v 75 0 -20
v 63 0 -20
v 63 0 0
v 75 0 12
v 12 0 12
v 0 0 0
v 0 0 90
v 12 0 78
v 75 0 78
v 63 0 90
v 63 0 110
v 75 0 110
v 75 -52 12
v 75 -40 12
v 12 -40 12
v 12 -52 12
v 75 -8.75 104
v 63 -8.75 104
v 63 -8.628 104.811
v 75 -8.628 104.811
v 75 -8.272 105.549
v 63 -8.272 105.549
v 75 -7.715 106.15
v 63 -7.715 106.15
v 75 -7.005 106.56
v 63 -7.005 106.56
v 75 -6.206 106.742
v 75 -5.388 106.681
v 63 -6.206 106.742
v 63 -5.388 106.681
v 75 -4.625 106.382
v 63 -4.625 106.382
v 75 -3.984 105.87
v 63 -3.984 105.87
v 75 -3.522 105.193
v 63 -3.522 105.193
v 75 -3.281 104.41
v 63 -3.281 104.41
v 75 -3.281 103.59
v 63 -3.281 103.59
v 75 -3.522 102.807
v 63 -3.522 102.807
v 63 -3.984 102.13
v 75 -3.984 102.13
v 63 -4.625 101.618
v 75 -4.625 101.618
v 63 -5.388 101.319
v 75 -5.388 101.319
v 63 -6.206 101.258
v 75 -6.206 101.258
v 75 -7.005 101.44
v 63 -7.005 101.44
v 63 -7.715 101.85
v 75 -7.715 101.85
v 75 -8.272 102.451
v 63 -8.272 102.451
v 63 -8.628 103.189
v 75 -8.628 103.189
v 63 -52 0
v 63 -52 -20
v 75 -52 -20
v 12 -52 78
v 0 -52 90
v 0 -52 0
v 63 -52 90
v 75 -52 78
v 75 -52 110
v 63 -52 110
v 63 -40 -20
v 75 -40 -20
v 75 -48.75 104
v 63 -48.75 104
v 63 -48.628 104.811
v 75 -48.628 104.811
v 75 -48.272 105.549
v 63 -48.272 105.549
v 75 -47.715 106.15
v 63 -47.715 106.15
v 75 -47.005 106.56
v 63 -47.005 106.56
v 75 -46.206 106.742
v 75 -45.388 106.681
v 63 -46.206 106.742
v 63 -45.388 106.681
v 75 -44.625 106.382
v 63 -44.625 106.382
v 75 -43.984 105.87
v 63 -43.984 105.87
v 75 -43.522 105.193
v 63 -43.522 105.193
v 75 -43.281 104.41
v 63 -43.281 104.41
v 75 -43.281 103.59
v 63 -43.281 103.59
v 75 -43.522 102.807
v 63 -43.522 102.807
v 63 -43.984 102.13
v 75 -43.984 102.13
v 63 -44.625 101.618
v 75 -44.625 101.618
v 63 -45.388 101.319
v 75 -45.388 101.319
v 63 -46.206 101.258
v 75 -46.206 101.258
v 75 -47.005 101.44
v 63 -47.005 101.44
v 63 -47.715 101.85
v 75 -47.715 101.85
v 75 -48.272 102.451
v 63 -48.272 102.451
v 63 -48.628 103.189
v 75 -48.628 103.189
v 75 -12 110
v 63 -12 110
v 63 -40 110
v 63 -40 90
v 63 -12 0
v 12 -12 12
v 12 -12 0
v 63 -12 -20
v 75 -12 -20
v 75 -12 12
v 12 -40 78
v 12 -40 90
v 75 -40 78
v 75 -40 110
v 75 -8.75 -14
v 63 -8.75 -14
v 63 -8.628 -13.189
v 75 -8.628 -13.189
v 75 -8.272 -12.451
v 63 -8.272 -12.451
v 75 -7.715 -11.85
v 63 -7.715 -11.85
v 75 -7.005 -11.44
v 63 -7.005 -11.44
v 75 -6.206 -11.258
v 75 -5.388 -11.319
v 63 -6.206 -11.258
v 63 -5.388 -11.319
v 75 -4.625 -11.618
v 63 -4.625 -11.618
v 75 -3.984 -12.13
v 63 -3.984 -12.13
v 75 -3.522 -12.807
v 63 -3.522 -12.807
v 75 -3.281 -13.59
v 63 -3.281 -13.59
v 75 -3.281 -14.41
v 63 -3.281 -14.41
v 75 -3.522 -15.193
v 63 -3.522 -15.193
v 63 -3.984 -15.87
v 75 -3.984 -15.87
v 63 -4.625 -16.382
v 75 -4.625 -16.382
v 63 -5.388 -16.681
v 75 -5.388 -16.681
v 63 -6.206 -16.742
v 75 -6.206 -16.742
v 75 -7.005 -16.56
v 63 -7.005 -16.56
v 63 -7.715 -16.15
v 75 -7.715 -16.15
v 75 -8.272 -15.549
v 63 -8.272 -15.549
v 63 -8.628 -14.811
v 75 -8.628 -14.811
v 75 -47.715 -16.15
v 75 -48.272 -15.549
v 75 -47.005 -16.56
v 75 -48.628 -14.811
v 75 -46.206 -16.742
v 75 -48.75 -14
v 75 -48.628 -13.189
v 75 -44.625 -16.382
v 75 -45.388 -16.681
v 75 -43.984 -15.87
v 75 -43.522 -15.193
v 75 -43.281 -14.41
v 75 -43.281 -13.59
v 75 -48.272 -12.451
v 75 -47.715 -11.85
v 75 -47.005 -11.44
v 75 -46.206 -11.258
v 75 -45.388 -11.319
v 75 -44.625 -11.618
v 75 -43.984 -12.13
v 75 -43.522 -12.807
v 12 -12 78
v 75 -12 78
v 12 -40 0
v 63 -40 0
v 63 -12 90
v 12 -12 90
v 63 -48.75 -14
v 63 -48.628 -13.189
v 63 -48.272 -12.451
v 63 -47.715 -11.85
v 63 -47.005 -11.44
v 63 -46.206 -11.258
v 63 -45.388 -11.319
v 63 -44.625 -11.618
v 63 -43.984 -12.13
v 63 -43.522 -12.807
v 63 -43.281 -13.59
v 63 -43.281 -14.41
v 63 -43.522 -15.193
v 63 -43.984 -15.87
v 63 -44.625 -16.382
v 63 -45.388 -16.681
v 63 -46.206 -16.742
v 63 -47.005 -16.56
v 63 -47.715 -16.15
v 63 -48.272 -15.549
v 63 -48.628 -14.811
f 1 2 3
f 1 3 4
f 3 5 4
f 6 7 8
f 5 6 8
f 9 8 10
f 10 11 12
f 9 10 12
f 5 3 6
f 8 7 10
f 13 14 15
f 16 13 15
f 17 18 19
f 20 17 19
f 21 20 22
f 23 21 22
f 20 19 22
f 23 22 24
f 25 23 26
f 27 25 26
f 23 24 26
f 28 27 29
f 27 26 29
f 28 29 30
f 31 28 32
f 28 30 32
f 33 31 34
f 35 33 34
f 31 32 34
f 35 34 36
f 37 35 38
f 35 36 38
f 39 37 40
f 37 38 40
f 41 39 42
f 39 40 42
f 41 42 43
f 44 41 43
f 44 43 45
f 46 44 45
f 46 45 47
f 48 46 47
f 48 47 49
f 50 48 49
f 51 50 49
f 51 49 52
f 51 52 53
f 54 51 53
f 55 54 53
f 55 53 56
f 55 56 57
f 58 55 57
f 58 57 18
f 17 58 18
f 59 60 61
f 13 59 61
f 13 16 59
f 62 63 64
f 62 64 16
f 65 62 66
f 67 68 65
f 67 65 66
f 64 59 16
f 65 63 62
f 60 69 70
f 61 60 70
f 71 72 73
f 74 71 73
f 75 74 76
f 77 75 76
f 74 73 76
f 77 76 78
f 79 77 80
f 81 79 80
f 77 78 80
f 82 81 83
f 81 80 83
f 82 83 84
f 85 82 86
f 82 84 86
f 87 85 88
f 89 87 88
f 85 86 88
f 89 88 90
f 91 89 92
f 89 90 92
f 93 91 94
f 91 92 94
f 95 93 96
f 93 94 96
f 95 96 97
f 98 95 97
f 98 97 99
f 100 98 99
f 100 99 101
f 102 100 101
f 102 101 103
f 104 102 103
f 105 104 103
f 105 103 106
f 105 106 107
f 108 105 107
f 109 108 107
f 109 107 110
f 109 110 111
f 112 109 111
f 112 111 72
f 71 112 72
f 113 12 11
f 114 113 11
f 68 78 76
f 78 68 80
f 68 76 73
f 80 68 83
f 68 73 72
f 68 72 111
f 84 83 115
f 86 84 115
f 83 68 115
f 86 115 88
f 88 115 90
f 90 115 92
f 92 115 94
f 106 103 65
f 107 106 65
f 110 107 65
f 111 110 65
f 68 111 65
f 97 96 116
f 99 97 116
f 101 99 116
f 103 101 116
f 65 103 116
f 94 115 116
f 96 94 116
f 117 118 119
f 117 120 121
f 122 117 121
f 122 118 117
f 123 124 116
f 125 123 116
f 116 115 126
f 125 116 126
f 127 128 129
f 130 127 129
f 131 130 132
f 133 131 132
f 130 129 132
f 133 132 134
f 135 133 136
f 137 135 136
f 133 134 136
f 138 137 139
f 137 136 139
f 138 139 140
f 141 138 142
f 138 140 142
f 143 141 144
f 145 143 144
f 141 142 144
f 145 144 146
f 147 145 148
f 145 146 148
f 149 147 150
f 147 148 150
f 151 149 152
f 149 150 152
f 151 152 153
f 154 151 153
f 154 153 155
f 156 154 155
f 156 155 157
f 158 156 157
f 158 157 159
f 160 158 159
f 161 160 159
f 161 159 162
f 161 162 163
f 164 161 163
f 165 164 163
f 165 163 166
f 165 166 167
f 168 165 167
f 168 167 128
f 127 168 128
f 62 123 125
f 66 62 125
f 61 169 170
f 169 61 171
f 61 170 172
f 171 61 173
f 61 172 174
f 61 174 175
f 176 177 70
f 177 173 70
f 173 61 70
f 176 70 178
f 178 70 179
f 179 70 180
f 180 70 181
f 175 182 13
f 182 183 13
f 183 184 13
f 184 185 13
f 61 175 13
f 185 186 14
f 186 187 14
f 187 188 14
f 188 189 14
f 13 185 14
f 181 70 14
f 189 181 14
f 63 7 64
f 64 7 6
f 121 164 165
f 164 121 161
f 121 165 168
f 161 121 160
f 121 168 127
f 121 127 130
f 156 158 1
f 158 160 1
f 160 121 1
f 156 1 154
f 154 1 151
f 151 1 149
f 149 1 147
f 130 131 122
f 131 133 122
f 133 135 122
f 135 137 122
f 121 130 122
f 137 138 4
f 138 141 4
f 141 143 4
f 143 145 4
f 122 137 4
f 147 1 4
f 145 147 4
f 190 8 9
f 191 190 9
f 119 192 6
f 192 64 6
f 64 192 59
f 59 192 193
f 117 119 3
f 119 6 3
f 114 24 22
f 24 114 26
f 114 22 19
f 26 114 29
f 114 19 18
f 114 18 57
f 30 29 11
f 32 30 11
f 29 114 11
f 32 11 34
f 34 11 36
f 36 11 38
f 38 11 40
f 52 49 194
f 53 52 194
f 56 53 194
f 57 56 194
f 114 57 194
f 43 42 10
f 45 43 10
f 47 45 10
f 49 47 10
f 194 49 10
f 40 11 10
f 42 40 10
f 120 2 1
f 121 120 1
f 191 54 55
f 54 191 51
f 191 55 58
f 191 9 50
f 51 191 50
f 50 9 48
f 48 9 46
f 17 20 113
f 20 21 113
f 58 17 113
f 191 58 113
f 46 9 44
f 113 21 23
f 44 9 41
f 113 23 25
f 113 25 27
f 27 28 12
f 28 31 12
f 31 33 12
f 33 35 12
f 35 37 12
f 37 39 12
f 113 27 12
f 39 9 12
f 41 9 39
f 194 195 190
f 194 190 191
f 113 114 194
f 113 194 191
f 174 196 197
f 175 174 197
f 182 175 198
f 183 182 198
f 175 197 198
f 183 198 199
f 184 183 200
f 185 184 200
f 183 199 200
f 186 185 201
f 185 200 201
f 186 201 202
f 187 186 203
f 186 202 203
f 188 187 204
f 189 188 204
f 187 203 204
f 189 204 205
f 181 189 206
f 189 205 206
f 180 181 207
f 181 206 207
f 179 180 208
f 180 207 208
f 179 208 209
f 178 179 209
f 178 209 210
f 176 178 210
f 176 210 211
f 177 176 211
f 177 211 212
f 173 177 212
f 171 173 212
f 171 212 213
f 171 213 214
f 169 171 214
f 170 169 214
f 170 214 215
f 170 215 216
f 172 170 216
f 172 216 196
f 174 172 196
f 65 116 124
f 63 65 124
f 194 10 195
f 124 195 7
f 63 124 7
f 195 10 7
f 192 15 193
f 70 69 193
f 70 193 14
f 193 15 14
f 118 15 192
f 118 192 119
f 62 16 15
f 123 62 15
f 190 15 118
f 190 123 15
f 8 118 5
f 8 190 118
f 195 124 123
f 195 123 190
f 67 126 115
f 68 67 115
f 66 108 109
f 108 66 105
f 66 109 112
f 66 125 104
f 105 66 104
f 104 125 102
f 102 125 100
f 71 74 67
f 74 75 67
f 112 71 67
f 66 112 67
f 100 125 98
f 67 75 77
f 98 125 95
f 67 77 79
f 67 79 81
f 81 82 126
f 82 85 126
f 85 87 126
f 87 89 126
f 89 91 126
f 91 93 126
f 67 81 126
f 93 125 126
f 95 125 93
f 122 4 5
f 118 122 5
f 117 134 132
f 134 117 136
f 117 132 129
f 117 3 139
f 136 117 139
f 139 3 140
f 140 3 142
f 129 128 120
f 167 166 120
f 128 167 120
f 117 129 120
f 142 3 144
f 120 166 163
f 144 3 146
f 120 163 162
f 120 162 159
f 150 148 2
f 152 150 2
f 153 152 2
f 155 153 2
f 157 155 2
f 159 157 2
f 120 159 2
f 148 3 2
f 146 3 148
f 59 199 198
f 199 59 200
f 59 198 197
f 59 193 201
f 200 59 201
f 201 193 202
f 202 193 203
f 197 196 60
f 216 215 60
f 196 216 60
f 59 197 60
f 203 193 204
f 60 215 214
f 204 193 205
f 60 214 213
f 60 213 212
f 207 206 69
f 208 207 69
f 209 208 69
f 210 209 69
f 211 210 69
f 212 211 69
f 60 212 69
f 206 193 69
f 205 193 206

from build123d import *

# Parameters (mm, degrees)
F1_DEPTH      = 52
F2_W          = 63
F2_H          = 28
F3_DEPTH      = 110.001
F3_DEPTH_BACK = 20.001
F4_R          = 2.75
F5_DEPTH      = 12.001


with BuildPart() as f1:
    # F0 (on Front) → F1 (new body)
    with BuildSketch(Plane.XZ):
        Polygon((0, 12), (0, 0), (63, 0), (63, -20), (75, -20), (75, 0), (75, 12), (12, 12), (12, 78), (75, 78), (75, 90), (75, 110), (63, 110), (63, 90), (0, 90), align=None)
    extrude(amount=F1_DEPTH)

    # F2 (on face) → F3 (cut, two sides)
    with BuildSketch(Plane.XY.offset(90)) as f3_sk:
        with Locations((43.5, -26)):
            Rectangle(F2_W, F2_H)
    extrude(amount=-F3_DEPTH, mode=Mode.SUBTRACT)
    extrude(f3_sk.sketch, amount=F3_DEPTH_BACK, mode=Mode.SUBTRACT)

    # F4 (on face) → F5 (cut, through all)
    with BuildSketch(Plane(origin=(63, 0, 0), x_dir=(0, -1, 0), z_dir=(-1, 0, 0))):
        with Locations((6, 104)):
            Circle(F4_R)
        with Locations((46, 104)):
            Circle(F4_R)
        with Locations((6, -14)):
            Circle(F4_R)
        with Locations((46, -14)):
            Circle(F4_R)
    extrude(amount=-F5_DEPTH, mode=Mode.SUBTRACT)


solid = f1.part
